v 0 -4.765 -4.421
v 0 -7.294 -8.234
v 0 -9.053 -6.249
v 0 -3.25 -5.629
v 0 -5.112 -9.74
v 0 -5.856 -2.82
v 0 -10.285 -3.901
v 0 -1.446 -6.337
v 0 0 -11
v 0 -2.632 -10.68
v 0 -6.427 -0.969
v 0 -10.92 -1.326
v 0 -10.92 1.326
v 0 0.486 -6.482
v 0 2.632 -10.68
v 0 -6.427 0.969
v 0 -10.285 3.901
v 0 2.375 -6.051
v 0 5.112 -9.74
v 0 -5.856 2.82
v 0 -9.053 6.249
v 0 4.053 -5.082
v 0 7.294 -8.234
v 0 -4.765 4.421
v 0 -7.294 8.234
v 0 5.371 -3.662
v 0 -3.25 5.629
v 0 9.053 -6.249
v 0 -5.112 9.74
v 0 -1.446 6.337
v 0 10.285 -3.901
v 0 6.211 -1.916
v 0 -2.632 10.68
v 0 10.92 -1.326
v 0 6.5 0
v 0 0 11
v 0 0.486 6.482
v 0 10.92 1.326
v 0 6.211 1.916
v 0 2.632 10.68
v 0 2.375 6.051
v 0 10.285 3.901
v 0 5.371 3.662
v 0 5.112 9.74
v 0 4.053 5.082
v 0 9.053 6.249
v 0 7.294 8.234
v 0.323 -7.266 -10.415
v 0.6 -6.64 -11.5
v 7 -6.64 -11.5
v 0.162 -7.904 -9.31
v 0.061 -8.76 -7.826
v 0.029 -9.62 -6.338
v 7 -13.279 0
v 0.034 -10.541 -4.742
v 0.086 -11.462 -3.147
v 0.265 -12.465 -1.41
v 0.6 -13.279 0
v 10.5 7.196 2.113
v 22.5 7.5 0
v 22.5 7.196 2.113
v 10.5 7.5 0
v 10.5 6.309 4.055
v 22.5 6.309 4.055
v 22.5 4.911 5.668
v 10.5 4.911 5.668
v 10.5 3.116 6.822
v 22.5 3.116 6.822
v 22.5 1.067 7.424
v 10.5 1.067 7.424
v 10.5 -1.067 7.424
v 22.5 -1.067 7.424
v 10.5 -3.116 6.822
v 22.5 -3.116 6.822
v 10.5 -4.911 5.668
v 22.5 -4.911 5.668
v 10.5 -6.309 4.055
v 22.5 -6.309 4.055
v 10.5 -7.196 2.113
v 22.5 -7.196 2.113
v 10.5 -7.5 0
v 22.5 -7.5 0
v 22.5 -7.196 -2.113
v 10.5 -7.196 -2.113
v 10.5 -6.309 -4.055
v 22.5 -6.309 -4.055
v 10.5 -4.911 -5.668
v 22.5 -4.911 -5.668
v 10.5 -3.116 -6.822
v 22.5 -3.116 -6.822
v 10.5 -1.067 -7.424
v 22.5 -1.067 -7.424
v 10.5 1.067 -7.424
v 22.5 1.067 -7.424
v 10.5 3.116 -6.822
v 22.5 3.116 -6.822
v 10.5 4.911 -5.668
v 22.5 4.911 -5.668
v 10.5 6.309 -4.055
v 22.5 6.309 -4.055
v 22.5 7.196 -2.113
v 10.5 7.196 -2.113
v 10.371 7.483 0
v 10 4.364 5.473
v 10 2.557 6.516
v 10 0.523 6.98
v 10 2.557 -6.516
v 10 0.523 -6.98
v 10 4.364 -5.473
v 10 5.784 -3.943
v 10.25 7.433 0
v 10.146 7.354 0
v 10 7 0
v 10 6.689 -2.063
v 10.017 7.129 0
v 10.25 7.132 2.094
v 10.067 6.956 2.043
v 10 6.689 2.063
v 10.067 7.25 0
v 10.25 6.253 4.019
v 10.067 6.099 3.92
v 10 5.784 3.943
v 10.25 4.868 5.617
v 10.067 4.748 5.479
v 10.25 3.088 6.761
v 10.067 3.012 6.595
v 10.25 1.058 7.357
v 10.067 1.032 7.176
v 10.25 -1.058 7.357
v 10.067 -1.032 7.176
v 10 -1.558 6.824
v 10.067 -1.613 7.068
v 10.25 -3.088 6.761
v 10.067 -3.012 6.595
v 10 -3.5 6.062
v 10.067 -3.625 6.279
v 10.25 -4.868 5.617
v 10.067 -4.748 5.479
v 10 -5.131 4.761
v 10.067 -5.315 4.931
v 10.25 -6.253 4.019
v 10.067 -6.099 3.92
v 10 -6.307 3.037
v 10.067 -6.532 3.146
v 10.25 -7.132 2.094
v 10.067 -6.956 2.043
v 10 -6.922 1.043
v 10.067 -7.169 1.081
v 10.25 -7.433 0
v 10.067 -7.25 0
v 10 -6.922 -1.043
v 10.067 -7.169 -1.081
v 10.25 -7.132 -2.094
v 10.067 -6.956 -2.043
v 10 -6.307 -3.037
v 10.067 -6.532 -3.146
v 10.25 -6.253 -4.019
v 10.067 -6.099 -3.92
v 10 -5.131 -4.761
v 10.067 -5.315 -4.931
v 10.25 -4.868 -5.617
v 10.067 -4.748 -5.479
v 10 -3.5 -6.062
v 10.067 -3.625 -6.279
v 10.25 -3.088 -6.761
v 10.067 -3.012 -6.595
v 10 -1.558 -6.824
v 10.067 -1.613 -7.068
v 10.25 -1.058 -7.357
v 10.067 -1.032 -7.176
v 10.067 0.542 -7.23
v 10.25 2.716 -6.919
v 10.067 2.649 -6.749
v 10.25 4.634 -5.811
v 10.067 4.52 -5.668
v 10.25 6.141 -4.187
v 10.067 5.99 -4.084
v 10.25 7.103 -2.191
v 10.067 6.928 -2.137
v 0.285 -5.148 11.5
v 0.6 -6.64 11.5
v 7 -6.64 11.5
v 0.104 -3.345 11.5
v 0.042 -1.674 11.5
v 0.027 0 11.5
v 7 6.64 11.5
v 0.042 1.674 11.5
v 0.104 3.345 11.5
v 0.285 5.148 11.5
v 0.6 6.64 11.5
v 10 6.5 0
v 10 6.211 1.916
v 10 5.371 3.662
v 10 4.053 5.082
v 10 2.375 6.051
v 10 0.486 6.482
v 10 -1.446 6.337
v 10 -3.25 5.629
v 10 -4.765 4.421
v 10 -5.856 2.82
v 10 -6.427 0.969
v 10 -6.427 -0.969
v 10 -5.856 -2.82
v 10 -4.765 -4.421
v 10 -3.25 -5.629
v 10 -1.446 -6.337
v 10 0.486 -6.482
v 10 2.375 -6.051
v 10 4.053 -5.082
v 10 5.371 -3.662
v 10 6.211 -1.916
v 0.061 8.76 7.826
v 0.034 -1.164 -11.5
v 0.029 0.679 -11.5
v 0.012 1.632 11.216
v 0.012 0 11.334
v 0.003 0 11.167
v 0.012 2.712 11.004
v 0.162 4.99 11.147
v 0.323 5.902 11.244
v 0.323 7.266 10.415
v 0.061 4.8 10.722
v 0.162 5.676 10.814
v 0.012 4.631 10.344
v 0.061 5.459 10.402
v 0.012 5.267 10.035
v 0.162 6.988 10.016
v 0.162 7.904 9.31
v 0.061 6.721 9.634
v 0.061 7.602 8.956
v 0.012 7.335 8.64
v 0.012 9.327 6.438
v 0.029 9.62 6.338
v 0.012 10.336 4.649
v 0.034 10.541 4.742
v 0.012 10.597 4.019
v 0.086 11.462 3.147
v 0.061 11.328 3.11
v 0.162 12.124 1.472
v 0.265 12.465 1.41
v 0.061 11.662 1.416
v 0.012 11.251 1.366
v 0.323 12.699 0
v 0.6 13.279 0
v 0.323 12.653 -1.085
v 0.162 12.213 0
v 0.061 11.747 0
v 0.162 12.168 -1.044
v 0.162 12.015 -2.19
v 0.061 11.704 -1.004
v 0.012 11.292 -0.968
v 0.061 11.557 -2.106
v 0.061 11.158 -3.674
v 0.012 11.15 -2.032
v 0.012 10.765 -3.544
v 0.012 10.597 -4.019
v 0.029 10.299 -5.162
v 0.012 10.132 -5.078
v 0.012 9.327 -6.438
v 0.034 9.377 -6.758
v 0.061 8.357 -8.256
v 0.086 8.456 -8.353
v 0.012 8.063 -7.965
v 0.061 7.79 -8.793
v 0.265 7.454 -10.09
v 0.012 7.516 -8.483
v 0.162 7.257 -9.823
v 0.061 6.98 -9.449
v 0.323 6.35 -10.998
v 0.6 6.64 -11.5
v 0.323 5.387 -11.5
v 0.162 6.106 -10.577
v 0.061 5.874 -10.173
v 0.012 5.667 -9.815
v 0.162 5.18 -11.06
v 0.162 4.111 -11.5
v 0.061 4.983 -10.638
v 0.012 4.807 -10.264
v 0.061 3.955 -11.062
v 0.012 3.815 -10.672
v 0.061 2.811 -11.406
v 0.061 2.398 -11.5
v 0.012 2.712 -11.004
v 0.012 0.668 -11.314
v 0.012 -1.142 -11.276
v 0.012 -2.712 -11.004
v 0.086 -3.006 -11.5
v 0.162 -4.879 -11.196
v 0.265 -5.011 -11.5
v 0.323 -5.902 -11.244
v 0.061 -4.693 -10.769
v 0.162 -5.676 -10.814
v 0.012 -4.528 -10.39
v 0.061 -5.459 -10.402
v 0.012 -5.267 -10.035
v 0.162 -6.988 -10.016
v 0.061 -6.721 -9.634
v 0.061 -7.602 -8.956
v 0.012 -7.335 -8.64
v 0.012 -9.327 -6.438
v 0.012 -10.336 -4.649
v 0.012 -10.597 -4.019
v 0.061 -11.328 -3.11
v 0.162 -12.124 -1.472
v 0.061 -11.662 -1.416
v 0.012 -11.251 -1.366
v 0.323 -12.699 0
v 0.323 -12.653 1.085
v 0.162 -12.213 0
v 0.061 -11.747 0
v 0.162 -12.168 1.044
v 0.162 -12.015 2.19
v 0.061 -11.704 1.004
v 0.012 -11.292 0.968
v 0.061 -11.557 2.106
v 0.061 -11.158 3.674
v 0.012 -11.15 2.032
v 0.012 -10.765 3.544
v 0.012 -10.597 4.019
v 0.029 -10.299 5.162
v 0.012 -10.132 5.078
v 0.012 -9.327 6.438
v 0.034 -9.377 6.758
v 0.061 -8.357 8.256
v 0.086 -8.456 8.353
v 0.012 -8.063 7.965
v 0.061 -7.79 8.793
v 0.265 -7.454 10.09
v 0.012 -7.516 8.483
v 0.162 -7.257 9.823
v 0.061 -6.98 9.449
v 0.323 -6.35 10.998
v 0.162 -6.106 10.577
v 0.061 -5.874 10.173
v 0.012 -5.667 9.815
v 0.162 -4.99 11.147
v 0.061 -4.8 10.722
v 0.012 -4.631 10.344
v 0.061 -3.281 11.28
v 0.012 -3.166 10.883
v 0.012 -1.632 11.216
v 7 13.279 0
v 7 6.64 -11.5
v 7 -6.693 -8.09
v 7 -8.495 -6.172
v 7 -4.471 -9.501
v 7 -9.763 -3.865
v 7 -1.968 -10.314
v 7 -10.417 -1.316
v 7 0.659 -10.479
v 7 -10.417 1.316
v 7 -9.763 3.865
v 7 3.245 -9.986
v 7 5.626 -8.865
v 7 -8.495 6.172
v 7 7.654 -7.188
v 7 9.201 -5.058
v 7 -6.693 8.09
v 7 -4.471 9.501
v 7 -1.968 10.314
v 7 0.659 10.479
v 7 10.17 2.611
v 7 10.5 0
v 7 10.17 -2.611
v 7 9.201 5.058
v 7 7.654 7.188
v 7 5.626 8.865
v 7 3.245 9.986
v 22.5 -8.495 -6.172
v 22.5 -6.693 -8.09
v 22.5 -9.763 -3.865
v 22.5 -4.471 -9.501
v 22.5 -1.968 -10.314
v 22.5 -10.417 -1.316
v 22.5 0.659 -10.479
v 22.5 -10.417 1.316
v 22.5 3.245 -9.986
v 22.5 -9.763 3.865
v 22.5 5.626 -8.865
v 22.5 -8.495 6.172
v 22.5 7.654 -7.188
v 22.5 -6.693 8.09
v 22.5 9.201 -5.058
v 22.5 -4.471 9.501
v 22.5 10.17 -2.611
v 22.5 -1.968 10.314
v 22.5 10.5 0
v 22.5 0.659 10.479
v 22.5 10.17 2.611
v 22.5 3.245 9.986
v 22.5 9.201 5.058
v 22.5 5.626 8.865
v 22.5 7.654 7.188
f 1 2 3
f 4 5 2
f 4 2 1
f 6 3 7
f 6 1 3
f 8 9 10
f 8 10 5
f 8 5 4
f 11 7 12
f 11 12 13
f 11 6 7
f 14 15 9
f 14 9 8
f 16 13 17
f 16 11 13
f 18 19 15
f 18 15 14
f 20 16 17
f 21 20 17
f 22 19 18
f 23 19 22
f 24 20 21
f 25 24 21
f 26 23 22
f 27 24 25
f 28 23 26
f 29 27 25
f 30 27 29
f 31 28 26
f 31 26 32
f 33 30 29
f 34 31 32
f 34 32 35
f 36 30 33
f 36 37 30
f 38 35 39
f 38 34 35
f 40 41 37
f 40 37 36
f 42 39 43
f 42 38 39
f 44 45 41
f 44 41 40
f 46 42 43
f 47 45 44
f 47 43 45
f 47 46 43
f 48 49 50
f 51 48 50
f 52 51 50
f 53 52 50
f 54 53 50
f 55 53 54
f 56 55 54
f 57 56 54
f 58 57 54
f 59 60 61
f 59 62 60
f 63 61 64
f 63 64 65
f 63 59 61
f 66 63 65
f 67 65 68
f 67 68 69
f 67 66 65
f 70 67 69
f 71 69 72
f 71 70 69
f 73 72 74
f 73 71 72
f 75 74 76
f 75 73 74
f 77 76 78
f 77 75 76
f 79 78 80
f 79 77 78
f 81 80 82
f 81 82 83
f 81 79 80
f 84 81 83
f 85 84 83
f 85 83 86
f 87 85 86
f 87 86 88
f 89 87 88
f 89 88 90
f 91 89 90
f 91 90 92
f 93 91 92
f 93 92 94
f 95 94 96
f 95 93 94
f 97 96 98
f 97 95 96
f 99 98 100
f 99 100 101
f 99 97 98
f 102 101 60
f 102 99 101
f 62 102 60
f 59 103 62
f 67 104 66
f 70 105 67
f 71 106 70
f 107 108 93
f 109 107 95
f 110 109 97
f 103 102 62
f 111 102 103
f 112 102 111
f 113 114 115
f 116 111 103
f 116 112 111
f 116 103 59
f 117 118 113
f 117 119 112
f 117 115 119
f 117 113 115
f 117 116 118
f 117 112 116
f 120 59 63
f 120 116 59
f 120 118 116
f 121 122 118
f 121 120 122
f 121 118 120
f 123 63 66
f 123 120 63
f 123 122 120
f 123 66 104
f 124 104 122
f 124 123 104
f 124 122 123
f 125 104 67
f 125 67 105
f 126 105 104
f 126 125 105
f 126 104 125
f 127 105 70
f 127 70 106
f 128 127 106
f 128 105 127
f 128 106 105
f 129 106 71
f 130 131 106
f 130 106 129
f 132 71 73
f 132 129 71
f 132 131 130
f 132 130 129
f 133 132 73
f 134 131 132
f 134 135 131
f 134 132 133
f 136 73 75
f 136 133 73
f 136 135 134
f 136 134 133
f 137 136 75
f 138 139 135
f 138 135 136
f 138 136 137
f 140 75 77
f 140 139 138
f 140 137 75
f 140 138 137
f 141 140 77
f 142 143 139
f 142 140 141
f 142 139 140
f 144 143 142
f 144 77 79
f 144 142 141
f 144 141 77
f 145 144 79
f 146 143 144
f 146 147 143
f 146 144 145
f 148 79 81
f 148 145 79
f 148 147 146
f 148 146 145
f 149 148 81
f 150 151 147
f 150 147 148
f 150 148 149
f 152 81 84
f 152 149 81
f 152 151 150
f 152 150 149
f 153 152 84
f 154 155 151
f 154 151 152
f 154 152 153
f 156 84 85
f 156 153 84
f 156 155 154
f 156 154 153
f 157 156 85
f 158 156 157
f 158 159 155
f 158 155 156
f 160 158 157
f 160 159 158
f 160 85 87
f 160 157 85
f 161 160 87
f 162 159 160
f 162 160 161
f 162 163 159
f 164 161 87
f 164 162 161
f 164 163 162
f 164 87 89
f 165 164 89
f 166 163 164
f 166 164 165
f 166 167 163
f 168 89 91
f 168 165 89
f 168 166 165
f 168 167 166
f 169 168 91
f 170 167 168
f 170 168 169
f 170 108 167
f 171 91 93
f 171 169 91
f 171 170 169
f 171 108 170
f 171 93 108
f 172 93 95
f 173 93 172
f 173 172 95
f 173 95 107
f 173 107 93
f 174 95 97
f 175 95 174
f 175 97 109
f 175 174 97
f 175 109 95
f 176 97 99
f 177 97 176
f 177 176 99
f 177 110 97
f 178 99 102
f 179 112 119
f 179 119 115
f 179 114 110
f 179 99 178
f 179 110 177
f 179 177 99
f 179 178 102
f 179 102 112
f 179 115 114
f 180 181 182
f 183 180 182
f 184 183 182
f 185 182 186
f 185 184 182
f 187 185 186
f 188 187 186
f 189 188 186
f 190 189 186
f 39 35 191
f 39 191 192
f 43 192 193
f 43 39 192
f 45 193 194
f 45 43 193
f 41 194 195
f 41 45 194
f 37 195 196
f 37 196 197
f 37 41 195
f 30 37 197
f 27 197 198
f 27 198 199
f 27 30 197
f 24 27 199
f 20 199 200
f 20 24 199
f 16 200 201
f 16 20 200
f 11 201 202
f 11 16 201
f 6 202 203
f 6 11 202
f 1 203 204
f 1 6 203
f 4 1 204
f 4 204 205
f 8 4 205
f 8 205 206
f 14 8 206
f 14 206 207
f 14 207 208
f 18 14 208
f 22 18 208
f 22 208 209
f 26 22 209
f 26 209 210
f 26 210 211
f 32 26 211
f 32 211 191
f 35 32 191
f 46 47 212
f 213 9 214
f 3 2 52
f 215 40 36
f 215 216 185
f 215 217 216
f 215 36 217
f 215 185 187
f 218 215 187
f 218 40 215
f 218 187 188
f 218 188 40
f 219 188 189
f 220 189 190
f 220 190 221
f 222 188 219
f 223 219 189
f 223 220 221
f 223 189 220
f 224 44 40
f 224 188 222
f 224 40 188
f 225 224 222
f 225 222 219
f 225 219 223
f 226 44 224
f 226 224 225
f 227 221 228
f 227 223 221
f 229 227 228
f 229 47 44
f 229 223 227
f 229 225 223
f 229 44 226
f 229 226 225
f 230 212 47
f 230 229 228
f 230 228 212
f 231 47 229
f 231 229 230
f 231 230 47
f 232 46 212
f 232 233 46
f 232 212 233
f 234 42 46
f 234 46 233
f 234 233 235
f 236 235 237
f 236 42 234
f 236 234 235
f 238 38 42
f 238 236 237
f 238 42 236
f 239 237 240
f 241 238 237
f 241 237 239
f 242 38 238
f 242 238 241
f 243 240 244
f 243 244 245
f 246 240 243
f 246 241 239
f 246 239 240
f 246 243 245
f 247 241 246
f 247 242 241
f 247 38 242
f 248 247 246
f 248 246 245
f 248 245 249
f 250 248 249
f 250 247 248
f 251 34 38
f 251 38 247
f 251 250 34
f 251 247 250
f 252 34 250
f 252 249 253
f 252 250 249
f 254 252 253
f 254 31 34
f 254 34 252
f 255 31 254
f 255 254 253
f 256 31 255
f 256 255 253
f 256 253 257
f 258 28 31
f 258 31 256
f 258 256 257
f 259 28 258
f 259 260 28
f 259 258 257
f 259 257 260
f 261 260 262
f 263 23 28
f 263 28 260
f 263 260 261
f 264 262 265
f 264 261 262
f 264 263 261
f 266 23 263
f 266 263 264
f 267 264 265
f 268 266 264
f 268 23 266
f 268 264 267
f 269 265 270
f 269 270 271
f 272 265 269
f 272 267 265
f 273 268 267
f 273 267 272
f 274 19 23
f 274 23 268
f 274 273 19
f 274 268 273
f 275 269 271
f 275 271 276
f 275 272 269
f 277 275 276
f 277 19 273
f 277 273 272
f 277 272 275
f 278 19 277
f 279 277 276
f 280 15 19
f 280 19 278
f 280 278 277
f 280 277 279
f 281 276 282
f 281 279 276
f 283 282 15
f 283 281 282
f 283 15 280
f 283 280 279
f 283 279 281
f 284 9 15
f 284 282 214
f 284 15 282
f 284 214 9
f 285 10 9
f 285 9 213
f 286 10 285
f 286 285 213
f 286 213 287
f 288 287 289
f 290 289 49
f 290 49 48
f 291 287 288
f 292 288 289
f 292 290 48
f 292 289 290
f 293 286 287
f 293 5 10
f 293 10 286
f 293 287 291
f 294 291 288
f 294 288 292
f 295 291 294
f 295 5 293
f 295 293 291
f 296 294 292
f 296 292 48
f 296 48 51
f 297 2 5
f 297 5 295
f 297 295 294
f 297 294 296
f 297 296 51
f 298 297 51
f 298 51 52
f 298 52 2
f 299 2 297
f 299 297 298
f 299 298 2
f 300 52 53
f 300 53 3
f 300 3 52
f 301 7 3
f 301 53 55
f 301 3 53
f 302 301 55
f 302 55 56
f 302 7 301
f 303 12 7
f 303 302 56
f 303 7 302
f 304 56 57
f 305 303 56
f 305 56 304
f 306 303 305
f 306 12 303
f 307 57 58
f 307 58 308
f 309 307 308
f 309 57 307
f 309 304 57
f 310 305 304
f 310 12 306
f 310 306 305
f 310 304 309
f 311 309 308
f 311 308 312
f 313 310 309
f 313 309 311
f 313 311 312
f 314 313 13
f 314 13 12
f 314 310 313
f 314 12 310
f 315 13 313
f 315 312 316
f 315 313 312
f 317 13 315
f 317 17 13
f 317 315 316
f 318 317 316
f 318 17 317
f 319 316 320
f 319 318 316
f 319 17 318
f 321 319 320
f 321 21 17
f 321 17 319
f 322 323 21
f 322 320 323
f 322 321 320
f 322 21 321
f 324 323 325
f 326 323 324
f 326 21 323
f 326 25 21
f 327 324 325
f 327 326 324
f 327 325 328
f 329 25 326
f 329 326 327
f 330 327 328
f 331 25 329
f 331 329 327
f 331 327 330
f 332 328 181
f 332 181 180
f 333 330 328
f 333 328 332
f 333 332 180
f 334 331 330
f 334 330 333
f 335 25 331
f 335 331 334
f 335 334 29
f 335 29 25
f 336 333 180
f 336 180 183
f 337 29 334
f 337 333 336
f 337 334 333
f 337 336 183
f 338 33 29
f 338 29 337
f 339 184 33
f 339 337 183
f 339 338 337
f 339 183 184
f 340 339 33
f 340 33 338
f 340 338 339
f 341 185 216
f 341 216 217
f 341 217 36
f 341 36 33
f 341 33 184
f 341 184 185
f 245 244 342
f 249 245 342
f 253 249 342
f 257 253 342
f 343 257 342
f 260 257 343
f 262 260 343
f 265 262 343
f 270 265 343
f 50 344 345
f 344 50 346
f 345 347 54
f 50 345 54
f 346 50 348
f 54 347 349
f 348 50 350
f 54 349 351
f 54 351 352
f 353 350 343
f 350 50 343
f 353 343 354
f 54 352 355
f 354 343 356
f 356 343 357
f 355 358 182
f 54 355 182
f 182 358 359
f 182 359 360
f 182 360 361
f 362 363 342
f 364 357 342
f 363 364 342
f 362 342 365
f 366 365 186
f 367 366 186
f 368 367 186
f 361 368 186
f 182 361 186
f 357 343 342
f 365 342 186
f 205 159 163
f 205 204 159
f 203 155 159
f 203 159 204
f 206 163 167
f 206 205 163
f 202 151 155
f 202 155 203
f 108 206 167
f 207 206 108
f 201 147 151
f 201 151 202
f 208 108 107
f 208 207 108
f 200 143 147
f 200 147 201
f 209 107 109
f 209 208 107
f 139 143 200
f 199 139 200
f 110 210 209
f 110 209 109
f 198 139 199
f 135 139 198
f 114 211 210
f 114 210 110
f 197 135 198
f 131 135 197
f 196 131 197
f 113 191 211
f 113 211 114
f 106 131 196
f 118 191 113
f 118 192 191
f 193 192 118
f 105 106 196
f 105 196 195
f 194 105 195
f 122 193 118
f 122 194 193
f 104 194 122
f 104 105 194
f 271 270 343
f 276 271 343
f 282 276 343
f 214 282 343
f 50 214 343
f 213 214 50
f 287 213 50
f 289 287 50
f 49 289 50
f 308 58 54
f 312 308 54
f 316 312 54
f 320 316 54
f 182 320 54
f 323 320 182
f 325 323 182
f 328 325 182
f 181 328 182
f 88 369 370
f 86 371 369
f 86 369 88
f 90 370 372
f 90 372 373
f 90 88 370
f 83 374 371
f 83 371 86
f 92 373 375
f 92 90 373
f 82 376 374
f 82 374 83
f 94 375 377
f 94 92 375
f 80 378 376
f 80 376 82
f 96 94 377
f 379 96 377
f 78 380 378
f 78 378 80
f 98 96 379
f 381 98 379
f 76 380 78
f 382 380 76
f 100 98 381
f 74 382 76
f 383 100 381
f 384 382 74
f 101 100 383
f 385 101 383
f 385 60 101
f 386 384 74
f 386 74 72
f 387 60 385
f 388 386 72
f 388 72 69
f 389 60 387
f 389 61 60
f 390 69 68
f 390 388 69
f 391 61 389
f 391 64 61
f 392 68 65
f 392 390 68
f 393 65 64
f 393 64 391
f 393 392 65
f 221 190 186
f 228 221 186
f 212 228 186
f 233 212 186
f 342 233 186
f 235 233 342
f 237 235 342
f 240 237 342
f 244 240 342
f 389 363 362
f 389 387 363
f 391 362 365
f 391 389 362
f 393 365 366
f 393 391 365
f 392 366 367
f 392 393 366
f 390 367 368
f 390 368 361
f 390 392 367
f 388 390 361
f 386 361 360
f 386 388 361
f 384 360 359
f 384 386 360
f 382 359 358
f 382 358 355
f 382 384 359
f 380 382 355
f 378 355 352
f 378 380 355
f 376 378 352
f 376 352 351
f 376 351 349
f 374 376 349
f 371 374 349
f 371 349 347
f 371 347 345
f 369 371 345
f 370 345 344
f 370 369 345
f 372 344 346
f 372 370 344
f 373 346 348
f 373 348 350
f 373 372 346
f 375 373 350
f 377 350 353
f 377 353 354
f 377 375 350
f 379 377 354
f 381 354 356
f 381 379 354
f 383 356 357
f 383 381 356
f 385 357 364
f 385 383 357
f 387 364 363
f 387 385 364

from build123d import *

# Parameters (mm, degrees)
SKETCH2_R           = 6.5
BOSS_EXTRUDE1_DEPTH = 7


with BuildPart() as part:
    # Sketch1 → Revolve1 (revolve)
    with BuildSketch(Plane.XY):
        with BuildLine():
            Line((0, 6.5), (0, 10.5))
            Line((0, 10.5), (22.5, 10.5))
            Line((22.5, 10.5), (22.5, 7.5))
            Line((22.5, 7.5), (10.5, 7.5))
            ThreePointArc((10.5, 7.5), (10.146446609, 7.353553391), (10, 7))
            Line((10, 7), (10, 6.5))
            Line((10, 6.5), (0, 6.5))
        make_face()
    revolve(axis=Axis((0, 0, 0), (1, 0, 0)))

    # Sketch2 → Boss-Extrude1 (add)
    with BuildSketch(Plane.ZY):
        Polygon((0, 13.279056191), (-11.5, 6.639528096), (-11.5, -6.639528096), (0, -13.279056191), (11.5, -6.639528096), (11.5, 6.639528096), align=None)
        Circle(SKETCH2_R, mode=Mode.SUBTRACT)
    extrude(amount=-BOSS_EXTRUDE1_DEPTH)

    # Cut-Sweep1: sweep along a path in Sketch6
    with BuildLine(Plane.ZY) as cut_sweep1_path:
        CenterArc((0, 0), 11.5, 0, 360)
    # Sketch5 → Cut-Sweep1 (sweep, cut)
    with BuildSketch(Plane.XY):
        with BuildLine():
            Line((0.6, 13.279056191), (0, 13.279056191))
            Line((0, 13.279056191), (0, 11))
            ThreePointArc((0, 11), (0.152512755, 12.178356602), (0.6, 13.279056191))
        make_face()
    sweep(path=cut_sweep1_path.line, mode=Mode.SUBTRACT)


solid = part.part
